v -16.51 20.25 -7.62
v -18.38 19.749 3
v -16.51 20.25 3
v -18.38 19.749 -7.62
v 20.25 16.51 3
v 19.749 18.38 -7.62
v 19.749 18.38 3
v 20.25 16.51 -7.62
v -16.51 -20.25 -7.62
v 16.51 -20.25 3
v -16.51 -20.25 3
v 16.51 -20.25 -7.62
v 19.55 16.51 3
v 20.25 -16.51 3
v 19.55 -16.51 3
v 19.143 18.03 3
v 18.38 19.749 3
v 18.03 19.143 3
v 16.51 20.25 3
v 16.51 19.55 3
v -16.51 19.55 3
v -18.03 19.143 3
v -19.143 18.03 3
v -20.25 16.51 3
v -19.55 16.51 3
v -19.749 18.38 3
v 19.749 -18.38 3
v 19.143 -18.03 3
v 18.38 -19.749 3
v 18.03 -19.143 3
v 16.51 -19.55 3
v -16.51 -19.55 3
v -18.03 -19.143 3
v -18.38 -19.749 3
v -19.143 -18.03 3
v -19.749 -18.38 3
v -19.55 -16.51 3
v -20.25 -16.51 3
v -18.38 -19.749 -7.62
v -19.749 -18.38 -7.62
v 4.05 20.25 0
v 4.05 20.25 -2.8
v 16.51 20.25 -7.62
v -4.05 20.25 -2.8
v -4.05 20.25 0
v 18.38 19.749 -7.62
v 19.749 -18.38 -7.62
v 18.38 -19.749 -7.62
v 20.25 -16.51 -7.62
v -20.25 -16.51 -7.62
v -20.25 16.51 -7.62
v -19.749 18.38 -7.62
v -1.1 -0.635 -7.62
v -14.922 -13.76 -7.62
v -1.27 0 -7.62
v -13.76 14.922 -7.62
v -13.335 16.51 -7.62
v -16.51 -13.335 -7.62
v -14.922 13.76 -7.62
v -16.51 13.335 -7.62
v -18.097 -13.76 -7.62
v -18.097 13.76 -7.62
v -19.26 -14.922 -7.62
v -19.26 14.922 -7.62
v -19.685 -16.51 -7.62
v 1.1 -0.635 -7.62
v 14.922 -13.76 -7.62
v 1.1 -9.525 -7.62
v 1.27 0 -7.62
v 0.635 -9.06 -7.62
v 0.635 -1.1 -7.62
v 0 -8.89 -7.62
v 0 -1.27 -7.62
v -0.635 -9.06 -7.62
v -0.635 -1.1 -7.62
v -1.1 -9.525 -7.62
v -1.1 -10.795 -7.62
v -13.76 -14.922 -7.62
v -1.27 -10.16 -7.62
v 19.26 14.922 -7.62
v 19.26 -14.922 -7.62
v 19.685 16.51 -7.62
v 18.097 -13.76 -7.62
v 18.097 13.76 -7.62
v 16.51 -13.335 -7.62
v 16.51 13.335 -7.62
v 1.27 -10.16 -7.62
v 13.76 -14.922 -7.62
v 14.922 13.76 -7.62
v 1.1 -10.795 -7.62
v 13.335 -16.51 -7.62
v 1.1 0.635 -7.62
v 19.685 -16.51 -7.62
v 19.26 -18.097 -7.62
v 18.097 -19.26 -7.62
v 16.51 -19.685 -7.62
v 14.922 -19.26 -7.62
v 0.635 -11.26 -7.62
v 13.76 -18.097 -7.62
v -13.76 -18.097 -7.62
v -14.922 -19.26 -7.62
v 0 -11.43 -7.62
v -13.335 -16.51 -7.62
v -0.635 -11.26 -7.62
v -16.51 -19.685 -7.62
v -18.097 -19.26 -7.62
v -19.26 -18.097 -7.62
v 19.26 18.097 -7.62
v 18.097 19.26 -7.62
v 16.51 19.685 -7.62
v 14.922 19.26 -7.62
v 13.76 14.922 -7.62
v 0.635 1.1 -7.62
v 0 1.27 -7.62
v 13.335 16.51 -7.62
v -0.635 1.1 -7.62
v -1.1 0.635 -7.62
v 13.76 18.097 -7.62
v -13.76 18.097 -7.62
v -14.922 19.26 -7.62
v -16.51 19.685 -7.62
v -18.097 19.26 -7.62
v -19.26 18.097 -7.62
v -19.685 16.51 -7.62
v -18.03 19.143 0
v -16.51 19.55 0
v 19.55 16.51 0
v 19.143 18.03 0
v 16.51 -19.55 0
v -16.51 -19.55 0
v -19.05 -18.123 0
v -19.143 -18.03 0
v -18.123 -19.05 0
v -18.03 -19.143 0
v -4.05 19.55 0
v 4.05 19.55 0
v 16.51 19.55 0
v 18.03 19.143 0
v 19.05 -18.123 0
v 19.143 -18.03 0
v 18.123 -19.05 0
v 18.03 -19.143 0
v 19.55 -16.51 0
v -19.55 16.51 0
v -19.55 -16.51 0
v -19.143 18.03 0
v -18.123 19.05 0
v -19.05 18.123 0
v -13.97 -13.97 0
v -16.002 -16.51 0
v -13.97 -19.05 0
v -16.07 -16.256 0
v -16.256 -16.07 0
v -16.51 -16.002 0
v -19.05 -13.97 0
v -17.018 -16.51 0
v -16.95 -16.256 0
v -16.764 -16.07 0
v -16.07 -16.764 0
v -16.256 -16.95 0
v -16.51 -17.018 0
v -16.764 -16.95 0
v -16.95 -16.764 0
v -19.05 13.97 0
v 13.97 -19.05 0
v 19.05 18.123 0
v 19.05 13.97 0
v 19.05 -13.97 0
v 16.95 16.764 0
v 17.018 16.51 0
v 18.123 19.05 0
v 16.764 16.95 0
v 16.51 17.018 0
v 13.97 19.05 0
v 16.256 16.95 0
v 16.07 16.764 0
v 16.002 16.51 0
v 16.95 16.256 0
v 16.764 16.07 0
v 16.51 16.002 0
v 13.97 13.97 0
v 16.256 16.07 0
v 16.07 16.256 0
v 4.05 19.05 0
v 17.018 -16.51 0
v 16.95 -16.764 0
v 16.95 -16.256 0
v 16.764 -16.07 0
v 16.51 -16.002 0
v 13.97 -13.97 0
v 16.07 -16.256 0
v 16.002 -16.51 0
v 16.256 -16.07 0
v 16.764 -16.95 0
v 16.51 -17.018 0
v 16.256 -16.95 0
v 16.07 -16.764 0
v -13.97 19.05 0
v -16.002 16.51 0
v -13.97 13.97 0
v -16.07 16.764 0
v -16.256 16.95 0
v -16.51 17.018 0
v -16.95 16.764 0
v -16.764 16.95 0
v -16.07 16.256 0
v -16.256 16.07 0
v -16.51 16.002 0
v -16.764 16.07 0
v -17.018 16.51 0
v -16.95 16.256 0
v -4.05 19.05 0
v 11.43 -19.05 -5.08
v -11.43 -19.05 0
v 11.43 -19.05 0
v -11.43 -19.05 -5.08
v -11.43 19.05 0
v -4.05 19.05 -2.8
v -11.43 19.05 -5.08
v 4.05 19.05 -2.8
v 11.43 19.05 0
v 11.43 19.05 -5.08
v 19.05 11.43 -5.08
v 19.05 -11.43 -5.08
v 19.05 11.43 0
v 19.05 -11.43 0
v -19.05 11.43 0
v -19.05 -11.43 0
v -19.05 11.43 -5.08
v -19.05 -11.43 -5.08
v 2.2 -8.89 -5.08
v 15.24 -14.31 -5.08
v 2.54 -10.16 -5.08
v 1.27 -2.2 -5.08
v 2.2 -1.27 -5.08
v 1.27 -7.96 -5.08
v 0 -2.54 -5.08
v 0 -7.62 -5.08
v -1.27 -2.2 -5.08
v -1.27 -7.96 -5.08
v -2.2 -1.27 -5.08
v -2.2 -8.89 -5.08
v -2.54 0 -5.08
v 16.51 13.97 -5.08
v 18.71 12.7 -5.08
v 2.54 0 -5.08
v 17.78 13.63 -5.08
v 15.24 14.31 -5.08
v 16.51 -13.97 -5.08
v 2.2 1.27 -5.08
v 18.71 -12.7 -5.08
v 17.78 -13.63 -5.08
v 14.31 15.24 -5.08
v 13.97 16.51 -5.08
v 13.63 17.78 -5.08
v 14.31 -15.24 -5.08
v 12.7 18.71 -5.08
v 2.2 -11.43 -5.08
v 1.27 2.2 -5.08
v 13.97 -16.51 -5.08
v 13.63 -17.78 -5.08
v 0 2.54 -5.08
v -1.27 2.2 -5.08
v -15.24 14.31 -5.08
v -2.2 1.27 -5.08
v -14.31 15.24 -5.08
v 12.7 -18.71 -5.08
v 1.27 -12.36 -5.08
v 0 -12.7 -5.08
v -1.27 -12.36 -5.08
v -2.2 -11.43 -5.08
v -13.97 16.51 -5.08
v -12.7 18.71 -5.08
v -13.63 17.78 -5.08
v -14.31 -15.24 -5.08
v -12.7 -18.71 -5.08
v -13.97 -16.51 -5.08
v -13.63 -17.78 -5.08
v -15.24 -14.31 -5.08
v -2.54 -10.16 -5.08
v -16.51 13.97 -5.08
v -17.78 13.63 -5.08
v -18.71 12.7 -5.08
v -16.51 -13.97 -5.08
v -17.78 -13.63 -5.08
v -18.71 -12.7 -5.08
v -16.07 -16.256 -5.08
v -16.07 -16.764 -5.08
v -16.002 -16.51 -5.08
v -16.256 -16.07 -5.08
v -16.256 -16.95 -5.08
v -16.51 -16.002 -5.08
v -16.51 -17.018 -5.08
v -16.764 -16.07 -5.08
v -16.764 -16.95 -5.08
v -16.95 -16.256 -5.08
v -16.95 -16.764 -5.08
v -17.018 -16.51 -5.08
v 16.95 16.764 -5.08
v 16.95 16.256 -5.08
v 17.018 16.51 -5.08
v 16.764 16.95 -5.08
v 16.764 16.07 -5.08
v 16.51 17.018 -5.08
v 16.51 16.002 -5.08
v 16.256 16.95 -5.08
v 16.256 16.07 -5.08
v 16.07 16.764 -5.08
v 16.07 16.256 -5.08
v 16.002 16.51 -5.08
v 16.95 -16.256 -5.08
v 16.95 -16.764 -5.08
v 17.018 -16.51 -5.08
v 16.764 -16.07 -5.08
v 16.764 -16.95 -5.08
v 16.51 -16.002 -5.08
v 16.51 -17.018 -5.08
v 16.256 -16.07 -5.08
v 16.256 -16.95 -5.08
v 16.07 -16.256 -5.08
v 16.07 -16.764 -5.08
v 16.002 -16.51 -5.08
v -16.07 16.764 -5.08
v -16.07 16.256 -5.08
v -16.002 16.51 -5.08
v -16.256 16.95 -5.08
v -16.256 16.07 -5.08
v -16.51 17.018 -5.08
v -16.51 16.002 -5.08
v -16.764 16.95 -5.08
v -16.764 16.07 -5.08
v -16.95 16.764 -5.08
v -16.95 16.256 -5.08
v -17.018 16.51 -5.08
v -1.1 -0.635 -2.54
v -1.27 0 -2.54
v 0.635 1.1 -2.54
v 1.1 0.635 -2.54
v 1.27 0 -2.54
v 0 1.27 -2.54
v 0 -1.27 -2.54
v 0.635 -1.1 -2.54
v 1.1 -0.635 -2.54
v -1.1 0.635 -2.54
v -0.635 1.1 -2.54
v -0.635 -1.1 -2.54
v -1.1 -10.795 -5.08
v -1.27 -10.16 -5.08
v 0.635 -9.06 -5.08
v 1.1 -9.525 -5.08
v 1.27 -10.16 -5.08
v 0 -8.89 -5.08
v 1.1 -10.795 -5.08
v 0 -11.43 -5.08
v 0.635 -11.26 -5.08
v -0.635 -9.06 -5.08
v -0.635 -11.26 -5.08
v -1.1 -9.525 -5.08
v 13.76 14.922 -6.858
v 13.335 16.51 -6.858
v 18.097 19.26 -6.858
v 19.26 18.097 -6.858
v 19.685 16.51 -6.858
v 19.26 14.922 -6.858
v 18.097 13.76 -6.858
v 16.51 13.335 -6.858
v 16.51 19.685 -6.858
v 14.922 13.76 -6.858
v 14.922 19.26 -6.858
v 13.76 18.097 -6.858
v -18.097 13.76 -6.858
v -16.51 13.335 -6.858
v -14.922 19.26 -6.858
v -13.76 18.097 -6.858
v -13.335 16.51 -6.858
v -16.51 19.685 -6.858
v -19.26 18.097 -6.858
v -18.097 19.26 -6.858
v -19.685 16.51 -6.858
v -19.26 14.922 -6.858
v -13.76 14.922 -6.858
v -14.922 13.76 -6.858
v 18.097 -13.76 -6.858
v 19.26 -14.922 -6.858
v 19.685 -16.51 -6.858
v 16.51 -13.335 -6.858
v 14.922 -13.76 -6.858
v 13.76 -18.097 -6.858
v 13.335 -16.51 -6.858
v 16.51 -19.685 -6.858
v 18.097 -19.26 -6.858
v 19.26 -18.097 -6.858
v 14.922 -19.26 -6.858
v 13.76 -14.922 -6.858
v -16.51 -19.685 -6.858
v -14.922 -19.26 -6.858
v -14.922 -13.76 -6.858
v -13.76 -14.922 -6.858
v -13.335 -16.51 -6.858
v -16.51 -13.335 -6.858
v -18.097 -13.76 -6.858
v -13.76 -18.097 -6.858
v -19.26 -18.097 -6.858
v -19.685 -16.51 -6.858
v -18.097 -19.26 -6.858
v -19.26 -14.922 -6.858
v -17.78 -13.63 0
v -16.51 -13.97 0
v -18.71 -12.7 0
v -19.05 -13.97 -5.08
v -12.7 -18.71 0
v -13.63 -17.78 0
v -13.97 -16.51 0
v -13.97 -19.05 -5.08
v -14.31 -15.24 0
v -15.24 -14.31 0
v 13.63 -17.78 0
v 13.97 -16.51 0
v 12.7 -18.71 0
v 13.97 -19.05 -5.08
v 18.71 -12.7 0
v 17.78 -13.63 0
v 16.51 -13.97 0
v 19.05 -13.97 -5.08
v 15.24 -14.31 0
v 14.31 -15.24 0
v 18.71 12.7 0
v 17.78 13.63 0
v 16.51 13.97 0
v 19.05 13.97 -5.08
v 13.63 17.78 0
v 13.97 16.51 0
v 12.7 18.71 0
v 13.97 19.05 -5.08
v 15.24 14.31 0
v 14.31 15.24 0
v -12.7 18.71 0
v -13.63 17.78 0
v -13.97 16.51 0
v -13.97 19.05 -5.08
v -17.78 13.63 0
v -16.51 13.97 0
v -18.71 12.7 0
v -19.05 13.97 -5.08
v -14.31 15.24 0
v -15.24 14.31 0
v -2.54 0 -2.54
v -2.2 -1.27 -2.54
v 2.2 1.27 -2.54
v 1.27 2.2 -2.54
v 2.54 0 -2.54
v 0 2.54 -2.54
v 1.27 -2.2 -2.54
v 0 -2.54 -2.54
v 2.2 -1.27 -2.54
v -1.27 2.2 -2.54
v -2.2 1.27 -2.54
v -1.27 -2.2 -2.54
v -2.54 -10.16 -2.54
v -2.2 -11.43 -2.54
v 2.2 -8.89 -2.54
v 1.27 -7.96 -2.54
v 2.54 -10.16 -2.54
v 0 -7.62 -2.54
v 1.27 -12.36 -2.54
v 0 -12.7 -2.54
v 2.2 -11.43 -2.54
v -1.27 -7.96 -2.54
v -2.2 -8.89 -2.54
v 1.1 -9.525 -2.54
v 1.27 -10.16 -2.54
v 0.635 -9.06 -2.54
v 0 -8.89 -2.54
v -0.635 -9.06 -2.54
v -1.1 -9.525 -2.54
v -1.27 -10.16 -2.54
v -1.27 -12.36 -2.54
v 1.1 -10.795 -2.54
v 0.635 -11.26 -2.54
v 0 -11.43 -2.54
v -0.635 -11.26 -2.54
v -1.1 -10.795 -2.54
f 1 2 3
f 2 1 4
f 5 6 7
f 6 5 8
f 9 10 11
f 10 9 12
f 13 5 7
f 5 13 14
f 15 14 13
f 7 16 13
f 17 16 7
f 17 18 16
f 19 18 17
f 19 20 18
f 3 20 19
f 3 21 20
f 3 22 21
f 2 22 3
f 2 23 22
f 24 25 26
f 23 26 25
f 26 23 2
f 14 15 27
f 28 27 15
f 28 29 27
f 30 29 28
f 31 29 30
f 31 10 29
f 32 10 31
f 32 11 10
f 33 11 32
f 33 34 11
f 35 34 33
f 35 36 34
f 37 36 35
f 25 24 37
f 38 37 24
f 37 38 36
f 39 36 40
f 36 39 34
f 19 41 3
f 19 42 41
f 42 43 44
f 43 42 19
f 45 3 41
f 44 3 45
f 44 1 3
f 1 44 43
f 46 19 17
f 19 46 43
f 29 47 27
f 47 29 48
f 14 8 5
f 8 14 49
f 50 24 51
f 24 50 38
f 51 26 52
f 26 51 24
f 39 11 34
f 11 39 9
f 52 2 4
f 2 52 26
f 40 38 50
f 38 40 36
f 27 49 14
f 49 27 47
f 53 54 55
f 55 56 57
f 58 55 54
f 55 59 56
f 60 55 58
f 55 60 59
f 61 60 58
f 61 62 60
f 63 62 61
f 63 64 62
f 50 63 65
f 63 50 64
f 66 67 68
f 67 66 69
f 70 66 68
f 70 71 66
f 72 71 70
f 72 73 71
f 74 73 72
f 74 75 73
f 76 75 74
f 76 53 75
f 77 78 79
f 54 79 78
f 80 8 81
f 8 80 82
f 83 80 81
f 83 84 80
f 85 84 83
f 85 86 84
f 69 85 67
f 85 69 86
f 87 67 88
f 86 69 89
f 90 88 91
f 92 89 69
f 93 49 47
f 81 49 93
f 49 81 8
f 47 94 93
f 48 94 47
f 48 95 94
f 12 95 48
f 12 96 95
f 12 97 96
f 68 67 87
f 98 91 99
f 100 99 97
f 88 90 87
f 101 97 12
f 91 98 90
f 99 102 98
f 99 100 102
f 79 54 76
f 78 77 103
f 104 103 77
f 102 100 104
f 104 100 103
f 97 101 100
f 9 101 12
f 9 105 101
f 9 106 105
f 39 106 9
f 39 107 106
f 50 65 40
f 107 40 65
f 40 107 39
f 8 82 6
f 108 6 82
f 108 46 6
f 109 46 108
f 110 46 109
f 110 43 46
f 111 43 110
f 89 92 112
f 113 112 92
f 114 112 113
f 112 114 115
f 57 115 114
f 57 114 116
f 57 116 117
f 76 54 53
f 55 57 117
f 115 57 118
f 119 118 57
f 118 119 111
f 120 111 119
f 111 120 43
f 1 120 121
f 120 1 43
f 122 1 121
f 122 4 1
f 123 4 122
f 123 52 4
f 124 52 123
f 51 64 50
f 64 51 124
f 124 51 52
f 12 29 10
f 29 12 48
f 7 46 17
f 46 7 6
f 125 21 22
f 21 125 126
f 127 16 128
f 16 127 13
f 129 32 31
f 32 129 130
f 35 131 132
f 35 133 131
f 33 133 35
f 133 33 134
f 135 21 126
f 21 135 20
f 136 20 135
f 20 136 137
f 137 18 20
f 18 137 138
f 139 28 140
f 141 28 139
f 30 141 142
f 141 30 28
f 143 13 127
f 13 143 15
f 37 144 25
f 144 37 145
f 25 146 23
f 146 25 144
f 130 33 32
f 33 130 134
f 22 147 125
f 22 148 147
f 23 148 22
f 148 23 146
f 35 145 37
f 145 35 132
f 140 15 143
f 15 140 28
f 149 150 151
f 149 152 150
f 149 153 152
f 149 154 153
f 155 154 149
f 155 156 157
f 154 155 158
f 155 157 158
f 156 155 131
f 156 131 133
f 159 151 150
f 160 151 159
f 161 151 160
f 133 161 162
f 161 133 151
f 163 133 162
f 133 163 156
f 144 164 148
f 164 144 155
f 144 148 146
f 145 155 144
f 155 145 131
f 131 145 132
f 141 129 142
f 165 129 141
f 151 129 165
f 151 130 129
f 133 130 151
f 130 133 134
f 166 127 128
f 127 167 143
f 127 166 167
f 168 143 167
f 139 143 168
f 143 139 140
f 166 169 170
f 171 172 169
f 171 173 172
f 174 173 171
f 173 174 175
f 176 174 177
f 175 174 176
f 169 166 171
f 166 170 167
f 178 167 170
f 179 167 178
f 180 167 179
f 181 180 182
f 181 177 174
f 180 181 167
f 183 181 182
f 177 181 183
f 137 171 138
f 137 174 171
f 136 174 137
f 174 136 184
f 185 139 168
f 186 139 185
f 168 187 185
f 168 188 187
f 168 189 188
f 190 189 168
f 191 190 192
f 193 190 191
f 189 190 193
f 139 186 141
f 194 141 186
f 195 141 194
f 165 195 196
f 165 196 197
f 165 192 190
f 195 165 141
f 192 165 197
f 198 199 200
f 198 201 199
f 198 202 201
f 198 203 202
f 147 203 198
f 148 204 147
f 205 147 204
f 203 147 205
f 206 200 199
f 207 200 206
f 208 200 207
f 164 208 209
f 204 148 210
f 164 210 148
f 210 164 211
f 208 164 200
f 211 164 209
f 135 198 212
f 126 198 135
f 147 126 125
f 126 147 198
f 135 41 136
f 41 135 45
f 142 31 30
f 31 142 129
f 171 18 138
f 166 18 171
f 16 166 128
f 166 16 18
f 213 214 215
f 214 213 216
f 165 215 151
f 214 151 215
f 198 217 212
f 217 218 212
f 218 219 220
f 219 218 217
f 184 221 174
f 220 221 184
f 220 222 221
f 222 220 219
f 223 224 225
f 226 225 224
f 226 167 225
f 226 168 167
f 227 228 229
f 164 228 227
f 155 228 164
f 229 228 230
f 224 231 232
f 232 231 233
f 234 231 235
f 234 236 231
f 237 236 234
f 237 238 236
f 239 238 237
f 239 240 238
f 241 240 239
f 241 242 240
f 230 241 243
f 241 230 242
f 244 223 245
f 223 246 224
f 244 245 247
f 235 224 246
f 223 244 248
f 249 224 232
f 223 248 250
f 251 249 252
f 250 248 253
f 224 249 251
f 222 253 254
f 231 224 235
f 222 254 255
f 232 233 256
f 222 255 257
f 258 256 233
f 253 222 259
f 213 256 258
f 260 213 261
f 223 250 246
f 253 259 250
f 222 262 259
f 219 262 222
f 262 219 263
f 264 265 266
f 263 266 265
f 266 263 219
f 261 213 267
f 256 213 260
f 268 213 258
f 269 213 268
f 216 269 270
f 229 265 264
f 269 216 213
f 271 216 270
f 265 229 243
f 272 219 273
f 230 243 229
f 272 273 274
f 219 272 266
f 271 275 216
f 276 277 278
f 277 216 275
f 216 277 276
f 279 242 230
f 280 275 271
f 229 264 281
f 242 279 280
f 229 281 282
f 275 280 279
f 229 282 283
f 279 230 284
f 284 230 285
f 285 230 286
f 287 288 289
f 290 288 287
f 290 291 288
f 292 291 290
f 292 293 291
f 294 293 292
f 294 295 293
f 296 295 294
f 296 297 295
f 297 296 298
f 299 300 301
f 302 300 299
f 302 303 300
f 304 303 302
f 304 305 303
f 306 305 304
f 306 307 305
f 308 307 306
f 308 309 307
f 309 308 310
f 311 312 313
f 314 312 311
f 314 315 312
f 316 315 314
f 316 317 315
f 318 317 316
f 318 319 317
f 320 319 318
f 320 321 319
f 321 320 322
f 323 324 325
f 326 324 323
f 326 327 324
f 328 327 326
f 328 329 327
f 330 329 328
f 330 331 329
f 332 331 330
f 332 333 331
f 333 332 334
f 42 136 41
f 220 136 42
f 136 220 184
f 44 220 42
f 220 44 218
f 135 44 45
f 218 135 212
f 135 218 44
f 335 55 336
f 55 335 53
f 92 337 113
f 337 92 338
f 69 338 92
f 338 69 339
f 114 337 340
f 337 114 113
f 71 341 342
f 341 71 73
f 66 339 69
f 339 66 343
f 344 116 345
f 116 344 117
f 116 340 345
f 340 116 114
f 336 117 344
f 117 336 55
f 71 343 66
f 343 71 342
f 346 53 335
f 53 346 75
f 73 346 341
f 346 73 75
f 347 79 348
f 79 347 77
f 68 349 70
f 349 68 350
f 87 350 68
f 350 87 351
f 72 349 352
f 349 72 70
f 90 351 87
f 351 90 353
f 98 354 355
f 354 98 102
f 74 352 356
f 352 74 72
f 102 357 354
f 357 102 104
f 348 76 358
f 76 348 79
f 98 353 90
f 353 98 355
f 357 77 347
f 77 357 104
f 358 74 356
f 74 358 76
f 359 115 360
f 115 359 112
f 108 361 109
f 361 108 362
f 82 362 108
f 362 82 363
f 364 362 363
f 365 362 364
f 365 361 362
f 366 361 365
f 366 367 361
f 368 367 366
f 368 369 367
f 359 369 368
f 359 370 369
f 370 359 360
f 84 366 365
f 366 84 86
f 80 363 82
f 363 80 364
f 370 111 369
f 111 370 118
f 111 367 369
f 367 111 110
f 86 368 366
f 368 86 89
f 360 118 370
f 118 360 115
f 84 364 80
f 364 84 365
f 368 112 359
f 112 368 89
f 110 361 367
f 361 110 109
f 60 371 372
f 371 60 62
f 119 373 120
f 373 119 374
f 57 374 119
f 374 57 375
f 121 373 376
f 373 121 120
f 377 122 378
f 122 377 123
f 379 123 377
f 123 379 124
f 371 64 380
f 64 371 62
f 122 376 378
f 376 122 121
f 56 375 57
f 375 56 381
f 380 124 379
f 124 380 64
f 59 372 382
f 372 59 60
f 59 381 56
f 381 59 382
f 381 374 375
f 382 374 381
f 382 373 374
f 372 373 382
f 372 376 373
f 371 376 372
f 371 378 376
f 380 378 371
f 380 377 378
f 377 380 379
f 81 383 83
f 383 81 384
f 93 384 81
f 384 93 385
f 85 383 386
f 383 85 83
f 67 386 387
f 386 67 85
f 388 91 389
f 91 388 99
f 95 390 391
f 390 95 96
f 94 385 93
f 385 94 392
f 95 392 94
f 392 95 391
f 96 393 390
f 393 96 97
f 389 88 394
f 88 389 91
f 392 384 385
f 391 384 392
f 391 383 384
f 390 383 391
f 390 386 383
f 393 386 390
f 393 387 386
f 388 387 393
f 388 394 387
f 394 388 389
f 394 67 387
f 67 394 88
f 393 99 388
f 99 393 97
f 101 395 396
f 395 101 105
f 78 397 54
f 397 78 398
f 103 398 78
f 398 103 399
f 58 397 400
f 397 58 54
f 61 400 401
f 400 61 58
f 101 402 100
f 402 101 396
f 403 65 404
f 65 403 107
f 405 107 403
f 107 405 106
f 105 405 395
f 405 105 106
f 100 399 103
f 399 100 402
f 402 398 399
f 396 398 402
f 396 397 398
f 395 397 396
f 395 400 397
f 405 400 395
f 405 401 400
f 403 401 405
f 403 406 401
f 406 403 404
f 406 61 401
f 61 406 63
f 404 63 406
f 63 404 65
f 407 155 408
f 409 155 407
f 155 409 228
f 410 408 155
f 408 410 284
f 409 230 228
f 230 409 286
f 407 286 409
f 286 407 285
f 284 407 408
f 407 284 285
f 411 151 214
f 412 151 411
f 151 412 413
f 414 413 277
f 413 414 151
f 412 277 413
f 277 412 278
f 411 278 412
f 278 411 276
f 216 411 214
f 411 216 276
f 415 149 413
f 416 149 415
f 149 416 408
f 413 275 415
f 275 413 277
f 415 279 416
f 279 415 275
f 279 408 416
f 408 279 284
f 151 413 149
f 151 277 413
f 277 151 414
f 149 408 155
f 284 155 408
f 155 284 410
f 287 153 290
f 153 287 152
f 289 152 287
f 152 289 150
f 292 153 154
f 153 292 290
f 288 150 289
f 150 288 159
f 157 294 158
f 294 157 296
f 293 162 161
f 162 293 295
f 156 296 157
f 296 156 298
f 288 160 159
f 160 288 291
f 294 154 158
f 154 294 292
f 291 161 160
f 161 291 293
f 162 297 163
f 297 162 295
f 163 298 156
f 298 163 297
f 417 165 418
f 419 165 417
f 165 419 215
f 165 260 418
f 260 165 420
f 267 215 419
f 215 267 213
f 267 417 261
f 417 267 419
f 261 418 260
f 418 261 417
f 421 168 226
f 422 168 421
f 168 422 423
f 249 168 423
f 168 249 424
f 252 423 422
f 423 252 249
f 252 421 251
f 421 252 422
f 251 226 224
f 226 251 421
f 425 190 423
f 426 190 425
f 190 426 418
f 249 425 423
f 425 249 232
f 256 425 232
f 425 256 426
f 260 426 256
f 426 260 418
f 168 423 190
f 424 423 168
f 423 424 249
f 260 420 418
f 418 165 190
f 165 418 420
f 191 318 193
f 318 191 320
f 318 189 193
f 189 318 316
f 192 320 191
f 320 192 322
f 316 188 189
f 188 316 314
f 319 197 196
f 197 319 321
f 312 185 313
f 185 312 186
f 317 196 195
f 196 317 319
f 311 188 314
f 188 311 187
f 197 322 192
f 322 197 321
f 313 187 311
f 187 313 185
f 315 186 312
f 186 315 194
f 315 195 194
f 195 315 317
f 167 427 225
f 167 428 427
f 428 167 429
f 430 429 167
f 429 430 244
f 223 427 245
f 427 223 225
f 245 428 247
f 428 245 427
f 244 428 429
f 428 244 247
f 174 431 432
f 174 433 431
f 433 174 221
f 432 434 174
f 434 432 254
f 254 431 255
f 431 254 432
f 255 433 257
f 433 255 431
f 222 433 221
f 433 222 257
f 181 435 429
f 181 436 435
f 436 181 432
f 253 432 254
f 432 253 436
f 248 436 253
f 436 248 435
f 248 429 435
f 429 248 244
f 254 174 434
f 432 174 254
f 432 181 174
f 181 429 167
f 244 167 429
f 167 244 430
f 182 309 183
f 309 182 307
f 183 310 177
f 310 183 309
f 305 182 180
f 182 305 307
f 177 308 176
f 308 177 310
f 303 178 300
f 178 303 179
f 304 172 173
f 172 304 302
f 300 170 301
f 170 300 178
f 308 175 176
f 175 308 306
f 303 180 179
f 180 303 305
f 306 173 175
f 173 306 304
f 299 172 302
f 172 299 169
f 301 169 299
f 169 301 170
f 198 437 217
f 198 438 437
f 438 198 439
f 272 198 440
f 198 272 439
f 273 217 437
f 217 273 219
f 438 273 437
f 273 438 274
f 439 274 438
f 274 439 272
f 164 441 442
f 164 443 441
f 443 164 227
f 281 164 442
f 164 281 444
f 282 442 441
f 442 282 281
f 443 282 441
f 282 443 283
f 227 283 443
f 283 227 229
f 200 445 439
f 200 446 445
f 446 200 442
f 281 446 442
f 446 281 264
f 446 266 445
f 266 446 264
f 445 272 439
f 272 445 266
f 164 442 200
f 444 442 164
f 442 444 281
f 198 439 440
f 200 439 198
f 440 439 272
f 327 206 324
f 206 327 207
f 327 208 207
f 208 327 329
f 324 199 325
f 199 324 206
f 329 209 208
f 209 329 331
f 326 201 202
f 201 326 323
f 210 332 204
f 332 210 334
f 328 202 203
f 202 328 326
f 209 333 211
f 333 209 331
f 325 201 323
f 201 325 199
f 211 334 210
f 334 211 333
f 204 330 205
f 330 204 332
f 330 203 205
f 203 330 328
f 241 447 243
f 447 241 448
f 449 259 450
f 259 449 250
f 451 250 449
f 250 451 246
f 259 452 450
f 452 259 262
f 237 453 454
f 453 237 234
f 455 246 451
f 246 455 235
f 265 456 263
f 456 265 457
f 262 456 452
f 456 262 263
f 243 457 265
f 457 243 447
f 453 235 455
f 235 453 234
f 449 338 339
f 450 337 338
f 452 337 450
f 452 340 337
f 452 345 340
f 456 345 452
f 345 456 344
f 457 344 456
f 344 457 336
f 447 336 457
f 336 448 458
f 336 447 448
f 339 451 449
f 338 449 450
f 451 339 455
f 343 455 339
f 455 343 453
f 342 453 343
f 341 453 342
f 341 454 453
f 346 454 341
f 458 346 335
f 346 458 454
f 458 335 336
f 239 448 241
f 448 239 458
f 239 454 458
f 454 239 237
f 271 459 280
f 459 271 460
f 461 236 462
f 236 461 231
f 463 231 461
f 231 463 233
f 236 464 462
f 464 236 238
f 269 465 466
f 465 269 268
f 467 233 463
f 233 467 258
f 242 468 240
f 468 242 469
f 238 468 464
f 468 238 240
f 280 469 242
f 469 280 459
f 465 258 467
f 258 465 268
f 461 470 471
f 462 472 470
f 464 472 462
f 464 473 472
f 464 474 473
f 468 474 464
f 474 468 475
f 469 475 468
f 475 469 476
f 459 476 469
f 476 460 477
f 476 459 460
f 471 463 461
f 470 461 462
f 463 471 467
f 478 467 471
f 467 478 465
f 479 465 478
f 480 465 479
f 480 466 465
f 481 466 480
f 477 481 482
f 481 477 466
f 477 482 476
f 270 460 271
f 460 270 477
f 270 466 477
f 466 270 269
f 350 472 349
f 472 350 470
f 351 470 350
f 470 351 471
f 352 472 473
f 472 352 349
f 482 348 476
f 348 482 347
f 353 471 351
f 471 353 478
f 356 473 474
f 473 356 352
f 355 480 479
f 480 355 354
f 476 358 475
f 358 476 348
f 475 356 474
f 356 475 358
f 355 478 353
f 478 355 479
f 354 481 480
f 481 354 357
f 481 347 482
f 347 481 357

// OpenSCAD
// file: shape-rounded-cube.scad
// Draws a cube with the vertical edges rounded.
// -Joe Walnes

module rounded_cube(width, depth, height, corner_radius) {
	translate([corner_radius, corner_radius, 0]) {
		minkowski() {
			cube([width - corner_radius * 2, depth - corner_radius * 2, height / 2]);	
			cylinder(r=corner_radius, h=height / 2);
		}
	}
}
// file: dimensions.scad
// TimeLantern
// ======
// This file contains all the dimensions used in the TimeLantern.
// -Joe Walnes

// Magic OpenSCAD variable to improve the number of segments used 
// in circles.
// High values give smoother curves. Lower values render quickly.
//$fn = 96; // Smooth
$fn = 12; // Fast

function mm(m) = m;
function inches(i) = mm(i) * 25.4; // inches -> mm

// --- PCB ---

pcb_width = inches(1.5);
pcb_thickness = inches(0.063);
pcb_corner_radius = inches(0.1);
pcb_hole_radius = inches(0.04);

// --- PCB components ---

lightbox_size = mm(10.16);

usb_width = mm(8.1); // 7.5 + 0.6 for tabs
usb_depth = mm(5);
usb_height = mm(2.8);

sensor_width = mm(4);
sensor_depth = mm(2);
sensor_height = mm(1.05);
sensor_gap_below = mm(1);
second_sensor_offset = inches(0.4);

// --- Base ---

outer_wall = mm(1.2); // take into account max USB male connector protusion. 
lip_height = mm(3);
lip_padding = mm(0.5);

base_height = inches(0.5);
base_floor_thickness = inches(0.1);

standoff_height = inches(0.2); // leave enough room for USB connector and tallest component
standoff_width = inches(0.1);
standoff_corner_radius = inches(0.1);
standoff_hole_radius = inches(0.02);

light_tube_radius = inches(0.1);
light_tube_hole_radius = inches(0.05);
light_tube_clearance_top = inches(0.1);

// Prototype uses these:
// http://www.amazon.com/gp/product/B003CIR2XU/
foot_pad_radius = inches(0.25) / 2;
foot_pad_height = inches(0.03);

// --- Lid ---

lid_height = inches(1);
lid_thickness = outer_wall;
// main file
// TimeLantern
// ========
// This is the base piece. Designed to be CNC milled from metal.
// - Joe Walnes (original design by Andrew Kim)

// TODO: Screw threads
// TODO: Space for label
// TODO: Verify dimensions for: pads, label, screws

include <dimensions.scad>;
use <shape-rounded-cube.scad>;

module base() {

	outer_width = pcb_width + outer_wall * 2;
	outer_height = standoff_height + base_floor_thickness;
	pad_offset = pcb_width / 2 - pcb_corner_radius;

	difference() {

		// Solid base, including lip
		translate([-outer_width / 2, -outer_width / 2, -outer_height]) {
			rounded_cube(outer_width, outer_width, outer_height + lip_height, pcb_corner_radius + outer_wall);
		}

		// Hollow out pcb area
		translate([-pcb_width / 2 - lip_padding, -pcb_width / 2 - lip_padding, 0]) {
			rounded_cube(pcb_width + lip_padding * 2, pcb_width + lip_padding * 2, lip_height * 2, pcb_corner_radius + lip_padding);
		}

		// Hollow out standoff area underneath
		translate([-pcb_width / 2, -pcb_width / 2, -standoff_height]) {
			rounded_cube(pcb_width, pcb_width, standoff_height, pcb_corner_radius);
		}

		// Cutout for USB connector
		translate([-usb_width / 2, outer_width / 2 - usb_depth, -usb_height]) {
			cube([usb_width, usb_depth + inches(0.1) /* extra bit */, usb_height]);
		}

		// Bottom holes for sensors
		translate([0, 0, -outer_height]) cylinder(r=light_tube_hole_radius, h=base_floor_thickness);
		translate([0, -second_sensor_offset, -outer_height]) cylinder(r=light_tube_hole_radius, h=base_floor_thickness);

		// Notches in bottom for foot pads
		translate([pad_offset, pad_offset, -outer_height]) cylinder(r=foot_pad_radius, h=foot_pad_height);
		translate([-pad_offset, pad_offset, -outer_height]) cylinder(r=foot_pad_radius, h=foot_pad_height);
		translate([pad_offset, -pad_offset, -outer_height]) cylinder(r=foot_pad_radius, h=foot_pad_height);
		translate([-pad_offset, -pad_offset, -outer_height]) cylinder(r=foot_pad_radius, h=foot_pad_height);

	}

	// Corner standoffs
	module standoff() {
		module rounded_edge(r, h, extra) {
			// extra is additional padding
			translate([r, r, 0]) {
				difference() {
					translate([-r -extra, -r -extra, 0]) cube([r + extra, r + extra, h]);
					cylinder(r=r, h=h);
				}
			}
		}	
	
		translate([-standoff_width, standoff_width, -standoff_height]) {
			rounded_edge(standoff_corner_radius, standoff_height, 0);
		}
		translate([standoff_width, -standoff_width, -standoff_height]) {
			rounded_edge(standoff_corner_radius, standoff_height, 0);	
		}
		
		extra_bit = inches(0.1); // ensures no edges remain after difference()
		difference() {
			translate([-standoff_width, -standoff_width, -standoff_height]) cube([standoff_width * 2, standoff_width * 2, standoff_height]);			
			translate([standoff_width, standoff_width, -standoff_height]) {
				rotate([0, 0, 180]) {
					rounded_edge(standoff_corner_radius, standoff_height, extra_bit);
				}
			}
			translate([0, 0, -standoff_height]) cylinder(h=standoff_height, r=standoff_hole_radius);
		}
	}

	for (angle = [0:90:270]) {
		rotate([0, 0, angle]) translate([pcb_corner_radius - pcb_width / 2, pcb_corner_radius - pcb_width / 2, 0]) standoff();
	}

	// Sensor light tubes
	translate([0, 0, -standoff_height]) {
		difference() {
			// Solid tube
			cylinder(r=light_tube_radius, h=standoff_height - light_tube_clearance_top);
			// Hollow it out
			cylinder(r=light_tube_hole_radius, h=standoff_height - light_tube_clearance_top);
		}
	}
	translate([0, -second_sensor_offset, -standoff_height]) {
		difference() {
			// Solid tube
			cylinder(r=light_tube_radius, h=standoff_height - light_tube_clearance_top);
			// Hollow it out
			cylinder(r=light_tube_hole_radius, h=standoff_height - light_tube_clearance_top);
		}
	}
	
}

base();
